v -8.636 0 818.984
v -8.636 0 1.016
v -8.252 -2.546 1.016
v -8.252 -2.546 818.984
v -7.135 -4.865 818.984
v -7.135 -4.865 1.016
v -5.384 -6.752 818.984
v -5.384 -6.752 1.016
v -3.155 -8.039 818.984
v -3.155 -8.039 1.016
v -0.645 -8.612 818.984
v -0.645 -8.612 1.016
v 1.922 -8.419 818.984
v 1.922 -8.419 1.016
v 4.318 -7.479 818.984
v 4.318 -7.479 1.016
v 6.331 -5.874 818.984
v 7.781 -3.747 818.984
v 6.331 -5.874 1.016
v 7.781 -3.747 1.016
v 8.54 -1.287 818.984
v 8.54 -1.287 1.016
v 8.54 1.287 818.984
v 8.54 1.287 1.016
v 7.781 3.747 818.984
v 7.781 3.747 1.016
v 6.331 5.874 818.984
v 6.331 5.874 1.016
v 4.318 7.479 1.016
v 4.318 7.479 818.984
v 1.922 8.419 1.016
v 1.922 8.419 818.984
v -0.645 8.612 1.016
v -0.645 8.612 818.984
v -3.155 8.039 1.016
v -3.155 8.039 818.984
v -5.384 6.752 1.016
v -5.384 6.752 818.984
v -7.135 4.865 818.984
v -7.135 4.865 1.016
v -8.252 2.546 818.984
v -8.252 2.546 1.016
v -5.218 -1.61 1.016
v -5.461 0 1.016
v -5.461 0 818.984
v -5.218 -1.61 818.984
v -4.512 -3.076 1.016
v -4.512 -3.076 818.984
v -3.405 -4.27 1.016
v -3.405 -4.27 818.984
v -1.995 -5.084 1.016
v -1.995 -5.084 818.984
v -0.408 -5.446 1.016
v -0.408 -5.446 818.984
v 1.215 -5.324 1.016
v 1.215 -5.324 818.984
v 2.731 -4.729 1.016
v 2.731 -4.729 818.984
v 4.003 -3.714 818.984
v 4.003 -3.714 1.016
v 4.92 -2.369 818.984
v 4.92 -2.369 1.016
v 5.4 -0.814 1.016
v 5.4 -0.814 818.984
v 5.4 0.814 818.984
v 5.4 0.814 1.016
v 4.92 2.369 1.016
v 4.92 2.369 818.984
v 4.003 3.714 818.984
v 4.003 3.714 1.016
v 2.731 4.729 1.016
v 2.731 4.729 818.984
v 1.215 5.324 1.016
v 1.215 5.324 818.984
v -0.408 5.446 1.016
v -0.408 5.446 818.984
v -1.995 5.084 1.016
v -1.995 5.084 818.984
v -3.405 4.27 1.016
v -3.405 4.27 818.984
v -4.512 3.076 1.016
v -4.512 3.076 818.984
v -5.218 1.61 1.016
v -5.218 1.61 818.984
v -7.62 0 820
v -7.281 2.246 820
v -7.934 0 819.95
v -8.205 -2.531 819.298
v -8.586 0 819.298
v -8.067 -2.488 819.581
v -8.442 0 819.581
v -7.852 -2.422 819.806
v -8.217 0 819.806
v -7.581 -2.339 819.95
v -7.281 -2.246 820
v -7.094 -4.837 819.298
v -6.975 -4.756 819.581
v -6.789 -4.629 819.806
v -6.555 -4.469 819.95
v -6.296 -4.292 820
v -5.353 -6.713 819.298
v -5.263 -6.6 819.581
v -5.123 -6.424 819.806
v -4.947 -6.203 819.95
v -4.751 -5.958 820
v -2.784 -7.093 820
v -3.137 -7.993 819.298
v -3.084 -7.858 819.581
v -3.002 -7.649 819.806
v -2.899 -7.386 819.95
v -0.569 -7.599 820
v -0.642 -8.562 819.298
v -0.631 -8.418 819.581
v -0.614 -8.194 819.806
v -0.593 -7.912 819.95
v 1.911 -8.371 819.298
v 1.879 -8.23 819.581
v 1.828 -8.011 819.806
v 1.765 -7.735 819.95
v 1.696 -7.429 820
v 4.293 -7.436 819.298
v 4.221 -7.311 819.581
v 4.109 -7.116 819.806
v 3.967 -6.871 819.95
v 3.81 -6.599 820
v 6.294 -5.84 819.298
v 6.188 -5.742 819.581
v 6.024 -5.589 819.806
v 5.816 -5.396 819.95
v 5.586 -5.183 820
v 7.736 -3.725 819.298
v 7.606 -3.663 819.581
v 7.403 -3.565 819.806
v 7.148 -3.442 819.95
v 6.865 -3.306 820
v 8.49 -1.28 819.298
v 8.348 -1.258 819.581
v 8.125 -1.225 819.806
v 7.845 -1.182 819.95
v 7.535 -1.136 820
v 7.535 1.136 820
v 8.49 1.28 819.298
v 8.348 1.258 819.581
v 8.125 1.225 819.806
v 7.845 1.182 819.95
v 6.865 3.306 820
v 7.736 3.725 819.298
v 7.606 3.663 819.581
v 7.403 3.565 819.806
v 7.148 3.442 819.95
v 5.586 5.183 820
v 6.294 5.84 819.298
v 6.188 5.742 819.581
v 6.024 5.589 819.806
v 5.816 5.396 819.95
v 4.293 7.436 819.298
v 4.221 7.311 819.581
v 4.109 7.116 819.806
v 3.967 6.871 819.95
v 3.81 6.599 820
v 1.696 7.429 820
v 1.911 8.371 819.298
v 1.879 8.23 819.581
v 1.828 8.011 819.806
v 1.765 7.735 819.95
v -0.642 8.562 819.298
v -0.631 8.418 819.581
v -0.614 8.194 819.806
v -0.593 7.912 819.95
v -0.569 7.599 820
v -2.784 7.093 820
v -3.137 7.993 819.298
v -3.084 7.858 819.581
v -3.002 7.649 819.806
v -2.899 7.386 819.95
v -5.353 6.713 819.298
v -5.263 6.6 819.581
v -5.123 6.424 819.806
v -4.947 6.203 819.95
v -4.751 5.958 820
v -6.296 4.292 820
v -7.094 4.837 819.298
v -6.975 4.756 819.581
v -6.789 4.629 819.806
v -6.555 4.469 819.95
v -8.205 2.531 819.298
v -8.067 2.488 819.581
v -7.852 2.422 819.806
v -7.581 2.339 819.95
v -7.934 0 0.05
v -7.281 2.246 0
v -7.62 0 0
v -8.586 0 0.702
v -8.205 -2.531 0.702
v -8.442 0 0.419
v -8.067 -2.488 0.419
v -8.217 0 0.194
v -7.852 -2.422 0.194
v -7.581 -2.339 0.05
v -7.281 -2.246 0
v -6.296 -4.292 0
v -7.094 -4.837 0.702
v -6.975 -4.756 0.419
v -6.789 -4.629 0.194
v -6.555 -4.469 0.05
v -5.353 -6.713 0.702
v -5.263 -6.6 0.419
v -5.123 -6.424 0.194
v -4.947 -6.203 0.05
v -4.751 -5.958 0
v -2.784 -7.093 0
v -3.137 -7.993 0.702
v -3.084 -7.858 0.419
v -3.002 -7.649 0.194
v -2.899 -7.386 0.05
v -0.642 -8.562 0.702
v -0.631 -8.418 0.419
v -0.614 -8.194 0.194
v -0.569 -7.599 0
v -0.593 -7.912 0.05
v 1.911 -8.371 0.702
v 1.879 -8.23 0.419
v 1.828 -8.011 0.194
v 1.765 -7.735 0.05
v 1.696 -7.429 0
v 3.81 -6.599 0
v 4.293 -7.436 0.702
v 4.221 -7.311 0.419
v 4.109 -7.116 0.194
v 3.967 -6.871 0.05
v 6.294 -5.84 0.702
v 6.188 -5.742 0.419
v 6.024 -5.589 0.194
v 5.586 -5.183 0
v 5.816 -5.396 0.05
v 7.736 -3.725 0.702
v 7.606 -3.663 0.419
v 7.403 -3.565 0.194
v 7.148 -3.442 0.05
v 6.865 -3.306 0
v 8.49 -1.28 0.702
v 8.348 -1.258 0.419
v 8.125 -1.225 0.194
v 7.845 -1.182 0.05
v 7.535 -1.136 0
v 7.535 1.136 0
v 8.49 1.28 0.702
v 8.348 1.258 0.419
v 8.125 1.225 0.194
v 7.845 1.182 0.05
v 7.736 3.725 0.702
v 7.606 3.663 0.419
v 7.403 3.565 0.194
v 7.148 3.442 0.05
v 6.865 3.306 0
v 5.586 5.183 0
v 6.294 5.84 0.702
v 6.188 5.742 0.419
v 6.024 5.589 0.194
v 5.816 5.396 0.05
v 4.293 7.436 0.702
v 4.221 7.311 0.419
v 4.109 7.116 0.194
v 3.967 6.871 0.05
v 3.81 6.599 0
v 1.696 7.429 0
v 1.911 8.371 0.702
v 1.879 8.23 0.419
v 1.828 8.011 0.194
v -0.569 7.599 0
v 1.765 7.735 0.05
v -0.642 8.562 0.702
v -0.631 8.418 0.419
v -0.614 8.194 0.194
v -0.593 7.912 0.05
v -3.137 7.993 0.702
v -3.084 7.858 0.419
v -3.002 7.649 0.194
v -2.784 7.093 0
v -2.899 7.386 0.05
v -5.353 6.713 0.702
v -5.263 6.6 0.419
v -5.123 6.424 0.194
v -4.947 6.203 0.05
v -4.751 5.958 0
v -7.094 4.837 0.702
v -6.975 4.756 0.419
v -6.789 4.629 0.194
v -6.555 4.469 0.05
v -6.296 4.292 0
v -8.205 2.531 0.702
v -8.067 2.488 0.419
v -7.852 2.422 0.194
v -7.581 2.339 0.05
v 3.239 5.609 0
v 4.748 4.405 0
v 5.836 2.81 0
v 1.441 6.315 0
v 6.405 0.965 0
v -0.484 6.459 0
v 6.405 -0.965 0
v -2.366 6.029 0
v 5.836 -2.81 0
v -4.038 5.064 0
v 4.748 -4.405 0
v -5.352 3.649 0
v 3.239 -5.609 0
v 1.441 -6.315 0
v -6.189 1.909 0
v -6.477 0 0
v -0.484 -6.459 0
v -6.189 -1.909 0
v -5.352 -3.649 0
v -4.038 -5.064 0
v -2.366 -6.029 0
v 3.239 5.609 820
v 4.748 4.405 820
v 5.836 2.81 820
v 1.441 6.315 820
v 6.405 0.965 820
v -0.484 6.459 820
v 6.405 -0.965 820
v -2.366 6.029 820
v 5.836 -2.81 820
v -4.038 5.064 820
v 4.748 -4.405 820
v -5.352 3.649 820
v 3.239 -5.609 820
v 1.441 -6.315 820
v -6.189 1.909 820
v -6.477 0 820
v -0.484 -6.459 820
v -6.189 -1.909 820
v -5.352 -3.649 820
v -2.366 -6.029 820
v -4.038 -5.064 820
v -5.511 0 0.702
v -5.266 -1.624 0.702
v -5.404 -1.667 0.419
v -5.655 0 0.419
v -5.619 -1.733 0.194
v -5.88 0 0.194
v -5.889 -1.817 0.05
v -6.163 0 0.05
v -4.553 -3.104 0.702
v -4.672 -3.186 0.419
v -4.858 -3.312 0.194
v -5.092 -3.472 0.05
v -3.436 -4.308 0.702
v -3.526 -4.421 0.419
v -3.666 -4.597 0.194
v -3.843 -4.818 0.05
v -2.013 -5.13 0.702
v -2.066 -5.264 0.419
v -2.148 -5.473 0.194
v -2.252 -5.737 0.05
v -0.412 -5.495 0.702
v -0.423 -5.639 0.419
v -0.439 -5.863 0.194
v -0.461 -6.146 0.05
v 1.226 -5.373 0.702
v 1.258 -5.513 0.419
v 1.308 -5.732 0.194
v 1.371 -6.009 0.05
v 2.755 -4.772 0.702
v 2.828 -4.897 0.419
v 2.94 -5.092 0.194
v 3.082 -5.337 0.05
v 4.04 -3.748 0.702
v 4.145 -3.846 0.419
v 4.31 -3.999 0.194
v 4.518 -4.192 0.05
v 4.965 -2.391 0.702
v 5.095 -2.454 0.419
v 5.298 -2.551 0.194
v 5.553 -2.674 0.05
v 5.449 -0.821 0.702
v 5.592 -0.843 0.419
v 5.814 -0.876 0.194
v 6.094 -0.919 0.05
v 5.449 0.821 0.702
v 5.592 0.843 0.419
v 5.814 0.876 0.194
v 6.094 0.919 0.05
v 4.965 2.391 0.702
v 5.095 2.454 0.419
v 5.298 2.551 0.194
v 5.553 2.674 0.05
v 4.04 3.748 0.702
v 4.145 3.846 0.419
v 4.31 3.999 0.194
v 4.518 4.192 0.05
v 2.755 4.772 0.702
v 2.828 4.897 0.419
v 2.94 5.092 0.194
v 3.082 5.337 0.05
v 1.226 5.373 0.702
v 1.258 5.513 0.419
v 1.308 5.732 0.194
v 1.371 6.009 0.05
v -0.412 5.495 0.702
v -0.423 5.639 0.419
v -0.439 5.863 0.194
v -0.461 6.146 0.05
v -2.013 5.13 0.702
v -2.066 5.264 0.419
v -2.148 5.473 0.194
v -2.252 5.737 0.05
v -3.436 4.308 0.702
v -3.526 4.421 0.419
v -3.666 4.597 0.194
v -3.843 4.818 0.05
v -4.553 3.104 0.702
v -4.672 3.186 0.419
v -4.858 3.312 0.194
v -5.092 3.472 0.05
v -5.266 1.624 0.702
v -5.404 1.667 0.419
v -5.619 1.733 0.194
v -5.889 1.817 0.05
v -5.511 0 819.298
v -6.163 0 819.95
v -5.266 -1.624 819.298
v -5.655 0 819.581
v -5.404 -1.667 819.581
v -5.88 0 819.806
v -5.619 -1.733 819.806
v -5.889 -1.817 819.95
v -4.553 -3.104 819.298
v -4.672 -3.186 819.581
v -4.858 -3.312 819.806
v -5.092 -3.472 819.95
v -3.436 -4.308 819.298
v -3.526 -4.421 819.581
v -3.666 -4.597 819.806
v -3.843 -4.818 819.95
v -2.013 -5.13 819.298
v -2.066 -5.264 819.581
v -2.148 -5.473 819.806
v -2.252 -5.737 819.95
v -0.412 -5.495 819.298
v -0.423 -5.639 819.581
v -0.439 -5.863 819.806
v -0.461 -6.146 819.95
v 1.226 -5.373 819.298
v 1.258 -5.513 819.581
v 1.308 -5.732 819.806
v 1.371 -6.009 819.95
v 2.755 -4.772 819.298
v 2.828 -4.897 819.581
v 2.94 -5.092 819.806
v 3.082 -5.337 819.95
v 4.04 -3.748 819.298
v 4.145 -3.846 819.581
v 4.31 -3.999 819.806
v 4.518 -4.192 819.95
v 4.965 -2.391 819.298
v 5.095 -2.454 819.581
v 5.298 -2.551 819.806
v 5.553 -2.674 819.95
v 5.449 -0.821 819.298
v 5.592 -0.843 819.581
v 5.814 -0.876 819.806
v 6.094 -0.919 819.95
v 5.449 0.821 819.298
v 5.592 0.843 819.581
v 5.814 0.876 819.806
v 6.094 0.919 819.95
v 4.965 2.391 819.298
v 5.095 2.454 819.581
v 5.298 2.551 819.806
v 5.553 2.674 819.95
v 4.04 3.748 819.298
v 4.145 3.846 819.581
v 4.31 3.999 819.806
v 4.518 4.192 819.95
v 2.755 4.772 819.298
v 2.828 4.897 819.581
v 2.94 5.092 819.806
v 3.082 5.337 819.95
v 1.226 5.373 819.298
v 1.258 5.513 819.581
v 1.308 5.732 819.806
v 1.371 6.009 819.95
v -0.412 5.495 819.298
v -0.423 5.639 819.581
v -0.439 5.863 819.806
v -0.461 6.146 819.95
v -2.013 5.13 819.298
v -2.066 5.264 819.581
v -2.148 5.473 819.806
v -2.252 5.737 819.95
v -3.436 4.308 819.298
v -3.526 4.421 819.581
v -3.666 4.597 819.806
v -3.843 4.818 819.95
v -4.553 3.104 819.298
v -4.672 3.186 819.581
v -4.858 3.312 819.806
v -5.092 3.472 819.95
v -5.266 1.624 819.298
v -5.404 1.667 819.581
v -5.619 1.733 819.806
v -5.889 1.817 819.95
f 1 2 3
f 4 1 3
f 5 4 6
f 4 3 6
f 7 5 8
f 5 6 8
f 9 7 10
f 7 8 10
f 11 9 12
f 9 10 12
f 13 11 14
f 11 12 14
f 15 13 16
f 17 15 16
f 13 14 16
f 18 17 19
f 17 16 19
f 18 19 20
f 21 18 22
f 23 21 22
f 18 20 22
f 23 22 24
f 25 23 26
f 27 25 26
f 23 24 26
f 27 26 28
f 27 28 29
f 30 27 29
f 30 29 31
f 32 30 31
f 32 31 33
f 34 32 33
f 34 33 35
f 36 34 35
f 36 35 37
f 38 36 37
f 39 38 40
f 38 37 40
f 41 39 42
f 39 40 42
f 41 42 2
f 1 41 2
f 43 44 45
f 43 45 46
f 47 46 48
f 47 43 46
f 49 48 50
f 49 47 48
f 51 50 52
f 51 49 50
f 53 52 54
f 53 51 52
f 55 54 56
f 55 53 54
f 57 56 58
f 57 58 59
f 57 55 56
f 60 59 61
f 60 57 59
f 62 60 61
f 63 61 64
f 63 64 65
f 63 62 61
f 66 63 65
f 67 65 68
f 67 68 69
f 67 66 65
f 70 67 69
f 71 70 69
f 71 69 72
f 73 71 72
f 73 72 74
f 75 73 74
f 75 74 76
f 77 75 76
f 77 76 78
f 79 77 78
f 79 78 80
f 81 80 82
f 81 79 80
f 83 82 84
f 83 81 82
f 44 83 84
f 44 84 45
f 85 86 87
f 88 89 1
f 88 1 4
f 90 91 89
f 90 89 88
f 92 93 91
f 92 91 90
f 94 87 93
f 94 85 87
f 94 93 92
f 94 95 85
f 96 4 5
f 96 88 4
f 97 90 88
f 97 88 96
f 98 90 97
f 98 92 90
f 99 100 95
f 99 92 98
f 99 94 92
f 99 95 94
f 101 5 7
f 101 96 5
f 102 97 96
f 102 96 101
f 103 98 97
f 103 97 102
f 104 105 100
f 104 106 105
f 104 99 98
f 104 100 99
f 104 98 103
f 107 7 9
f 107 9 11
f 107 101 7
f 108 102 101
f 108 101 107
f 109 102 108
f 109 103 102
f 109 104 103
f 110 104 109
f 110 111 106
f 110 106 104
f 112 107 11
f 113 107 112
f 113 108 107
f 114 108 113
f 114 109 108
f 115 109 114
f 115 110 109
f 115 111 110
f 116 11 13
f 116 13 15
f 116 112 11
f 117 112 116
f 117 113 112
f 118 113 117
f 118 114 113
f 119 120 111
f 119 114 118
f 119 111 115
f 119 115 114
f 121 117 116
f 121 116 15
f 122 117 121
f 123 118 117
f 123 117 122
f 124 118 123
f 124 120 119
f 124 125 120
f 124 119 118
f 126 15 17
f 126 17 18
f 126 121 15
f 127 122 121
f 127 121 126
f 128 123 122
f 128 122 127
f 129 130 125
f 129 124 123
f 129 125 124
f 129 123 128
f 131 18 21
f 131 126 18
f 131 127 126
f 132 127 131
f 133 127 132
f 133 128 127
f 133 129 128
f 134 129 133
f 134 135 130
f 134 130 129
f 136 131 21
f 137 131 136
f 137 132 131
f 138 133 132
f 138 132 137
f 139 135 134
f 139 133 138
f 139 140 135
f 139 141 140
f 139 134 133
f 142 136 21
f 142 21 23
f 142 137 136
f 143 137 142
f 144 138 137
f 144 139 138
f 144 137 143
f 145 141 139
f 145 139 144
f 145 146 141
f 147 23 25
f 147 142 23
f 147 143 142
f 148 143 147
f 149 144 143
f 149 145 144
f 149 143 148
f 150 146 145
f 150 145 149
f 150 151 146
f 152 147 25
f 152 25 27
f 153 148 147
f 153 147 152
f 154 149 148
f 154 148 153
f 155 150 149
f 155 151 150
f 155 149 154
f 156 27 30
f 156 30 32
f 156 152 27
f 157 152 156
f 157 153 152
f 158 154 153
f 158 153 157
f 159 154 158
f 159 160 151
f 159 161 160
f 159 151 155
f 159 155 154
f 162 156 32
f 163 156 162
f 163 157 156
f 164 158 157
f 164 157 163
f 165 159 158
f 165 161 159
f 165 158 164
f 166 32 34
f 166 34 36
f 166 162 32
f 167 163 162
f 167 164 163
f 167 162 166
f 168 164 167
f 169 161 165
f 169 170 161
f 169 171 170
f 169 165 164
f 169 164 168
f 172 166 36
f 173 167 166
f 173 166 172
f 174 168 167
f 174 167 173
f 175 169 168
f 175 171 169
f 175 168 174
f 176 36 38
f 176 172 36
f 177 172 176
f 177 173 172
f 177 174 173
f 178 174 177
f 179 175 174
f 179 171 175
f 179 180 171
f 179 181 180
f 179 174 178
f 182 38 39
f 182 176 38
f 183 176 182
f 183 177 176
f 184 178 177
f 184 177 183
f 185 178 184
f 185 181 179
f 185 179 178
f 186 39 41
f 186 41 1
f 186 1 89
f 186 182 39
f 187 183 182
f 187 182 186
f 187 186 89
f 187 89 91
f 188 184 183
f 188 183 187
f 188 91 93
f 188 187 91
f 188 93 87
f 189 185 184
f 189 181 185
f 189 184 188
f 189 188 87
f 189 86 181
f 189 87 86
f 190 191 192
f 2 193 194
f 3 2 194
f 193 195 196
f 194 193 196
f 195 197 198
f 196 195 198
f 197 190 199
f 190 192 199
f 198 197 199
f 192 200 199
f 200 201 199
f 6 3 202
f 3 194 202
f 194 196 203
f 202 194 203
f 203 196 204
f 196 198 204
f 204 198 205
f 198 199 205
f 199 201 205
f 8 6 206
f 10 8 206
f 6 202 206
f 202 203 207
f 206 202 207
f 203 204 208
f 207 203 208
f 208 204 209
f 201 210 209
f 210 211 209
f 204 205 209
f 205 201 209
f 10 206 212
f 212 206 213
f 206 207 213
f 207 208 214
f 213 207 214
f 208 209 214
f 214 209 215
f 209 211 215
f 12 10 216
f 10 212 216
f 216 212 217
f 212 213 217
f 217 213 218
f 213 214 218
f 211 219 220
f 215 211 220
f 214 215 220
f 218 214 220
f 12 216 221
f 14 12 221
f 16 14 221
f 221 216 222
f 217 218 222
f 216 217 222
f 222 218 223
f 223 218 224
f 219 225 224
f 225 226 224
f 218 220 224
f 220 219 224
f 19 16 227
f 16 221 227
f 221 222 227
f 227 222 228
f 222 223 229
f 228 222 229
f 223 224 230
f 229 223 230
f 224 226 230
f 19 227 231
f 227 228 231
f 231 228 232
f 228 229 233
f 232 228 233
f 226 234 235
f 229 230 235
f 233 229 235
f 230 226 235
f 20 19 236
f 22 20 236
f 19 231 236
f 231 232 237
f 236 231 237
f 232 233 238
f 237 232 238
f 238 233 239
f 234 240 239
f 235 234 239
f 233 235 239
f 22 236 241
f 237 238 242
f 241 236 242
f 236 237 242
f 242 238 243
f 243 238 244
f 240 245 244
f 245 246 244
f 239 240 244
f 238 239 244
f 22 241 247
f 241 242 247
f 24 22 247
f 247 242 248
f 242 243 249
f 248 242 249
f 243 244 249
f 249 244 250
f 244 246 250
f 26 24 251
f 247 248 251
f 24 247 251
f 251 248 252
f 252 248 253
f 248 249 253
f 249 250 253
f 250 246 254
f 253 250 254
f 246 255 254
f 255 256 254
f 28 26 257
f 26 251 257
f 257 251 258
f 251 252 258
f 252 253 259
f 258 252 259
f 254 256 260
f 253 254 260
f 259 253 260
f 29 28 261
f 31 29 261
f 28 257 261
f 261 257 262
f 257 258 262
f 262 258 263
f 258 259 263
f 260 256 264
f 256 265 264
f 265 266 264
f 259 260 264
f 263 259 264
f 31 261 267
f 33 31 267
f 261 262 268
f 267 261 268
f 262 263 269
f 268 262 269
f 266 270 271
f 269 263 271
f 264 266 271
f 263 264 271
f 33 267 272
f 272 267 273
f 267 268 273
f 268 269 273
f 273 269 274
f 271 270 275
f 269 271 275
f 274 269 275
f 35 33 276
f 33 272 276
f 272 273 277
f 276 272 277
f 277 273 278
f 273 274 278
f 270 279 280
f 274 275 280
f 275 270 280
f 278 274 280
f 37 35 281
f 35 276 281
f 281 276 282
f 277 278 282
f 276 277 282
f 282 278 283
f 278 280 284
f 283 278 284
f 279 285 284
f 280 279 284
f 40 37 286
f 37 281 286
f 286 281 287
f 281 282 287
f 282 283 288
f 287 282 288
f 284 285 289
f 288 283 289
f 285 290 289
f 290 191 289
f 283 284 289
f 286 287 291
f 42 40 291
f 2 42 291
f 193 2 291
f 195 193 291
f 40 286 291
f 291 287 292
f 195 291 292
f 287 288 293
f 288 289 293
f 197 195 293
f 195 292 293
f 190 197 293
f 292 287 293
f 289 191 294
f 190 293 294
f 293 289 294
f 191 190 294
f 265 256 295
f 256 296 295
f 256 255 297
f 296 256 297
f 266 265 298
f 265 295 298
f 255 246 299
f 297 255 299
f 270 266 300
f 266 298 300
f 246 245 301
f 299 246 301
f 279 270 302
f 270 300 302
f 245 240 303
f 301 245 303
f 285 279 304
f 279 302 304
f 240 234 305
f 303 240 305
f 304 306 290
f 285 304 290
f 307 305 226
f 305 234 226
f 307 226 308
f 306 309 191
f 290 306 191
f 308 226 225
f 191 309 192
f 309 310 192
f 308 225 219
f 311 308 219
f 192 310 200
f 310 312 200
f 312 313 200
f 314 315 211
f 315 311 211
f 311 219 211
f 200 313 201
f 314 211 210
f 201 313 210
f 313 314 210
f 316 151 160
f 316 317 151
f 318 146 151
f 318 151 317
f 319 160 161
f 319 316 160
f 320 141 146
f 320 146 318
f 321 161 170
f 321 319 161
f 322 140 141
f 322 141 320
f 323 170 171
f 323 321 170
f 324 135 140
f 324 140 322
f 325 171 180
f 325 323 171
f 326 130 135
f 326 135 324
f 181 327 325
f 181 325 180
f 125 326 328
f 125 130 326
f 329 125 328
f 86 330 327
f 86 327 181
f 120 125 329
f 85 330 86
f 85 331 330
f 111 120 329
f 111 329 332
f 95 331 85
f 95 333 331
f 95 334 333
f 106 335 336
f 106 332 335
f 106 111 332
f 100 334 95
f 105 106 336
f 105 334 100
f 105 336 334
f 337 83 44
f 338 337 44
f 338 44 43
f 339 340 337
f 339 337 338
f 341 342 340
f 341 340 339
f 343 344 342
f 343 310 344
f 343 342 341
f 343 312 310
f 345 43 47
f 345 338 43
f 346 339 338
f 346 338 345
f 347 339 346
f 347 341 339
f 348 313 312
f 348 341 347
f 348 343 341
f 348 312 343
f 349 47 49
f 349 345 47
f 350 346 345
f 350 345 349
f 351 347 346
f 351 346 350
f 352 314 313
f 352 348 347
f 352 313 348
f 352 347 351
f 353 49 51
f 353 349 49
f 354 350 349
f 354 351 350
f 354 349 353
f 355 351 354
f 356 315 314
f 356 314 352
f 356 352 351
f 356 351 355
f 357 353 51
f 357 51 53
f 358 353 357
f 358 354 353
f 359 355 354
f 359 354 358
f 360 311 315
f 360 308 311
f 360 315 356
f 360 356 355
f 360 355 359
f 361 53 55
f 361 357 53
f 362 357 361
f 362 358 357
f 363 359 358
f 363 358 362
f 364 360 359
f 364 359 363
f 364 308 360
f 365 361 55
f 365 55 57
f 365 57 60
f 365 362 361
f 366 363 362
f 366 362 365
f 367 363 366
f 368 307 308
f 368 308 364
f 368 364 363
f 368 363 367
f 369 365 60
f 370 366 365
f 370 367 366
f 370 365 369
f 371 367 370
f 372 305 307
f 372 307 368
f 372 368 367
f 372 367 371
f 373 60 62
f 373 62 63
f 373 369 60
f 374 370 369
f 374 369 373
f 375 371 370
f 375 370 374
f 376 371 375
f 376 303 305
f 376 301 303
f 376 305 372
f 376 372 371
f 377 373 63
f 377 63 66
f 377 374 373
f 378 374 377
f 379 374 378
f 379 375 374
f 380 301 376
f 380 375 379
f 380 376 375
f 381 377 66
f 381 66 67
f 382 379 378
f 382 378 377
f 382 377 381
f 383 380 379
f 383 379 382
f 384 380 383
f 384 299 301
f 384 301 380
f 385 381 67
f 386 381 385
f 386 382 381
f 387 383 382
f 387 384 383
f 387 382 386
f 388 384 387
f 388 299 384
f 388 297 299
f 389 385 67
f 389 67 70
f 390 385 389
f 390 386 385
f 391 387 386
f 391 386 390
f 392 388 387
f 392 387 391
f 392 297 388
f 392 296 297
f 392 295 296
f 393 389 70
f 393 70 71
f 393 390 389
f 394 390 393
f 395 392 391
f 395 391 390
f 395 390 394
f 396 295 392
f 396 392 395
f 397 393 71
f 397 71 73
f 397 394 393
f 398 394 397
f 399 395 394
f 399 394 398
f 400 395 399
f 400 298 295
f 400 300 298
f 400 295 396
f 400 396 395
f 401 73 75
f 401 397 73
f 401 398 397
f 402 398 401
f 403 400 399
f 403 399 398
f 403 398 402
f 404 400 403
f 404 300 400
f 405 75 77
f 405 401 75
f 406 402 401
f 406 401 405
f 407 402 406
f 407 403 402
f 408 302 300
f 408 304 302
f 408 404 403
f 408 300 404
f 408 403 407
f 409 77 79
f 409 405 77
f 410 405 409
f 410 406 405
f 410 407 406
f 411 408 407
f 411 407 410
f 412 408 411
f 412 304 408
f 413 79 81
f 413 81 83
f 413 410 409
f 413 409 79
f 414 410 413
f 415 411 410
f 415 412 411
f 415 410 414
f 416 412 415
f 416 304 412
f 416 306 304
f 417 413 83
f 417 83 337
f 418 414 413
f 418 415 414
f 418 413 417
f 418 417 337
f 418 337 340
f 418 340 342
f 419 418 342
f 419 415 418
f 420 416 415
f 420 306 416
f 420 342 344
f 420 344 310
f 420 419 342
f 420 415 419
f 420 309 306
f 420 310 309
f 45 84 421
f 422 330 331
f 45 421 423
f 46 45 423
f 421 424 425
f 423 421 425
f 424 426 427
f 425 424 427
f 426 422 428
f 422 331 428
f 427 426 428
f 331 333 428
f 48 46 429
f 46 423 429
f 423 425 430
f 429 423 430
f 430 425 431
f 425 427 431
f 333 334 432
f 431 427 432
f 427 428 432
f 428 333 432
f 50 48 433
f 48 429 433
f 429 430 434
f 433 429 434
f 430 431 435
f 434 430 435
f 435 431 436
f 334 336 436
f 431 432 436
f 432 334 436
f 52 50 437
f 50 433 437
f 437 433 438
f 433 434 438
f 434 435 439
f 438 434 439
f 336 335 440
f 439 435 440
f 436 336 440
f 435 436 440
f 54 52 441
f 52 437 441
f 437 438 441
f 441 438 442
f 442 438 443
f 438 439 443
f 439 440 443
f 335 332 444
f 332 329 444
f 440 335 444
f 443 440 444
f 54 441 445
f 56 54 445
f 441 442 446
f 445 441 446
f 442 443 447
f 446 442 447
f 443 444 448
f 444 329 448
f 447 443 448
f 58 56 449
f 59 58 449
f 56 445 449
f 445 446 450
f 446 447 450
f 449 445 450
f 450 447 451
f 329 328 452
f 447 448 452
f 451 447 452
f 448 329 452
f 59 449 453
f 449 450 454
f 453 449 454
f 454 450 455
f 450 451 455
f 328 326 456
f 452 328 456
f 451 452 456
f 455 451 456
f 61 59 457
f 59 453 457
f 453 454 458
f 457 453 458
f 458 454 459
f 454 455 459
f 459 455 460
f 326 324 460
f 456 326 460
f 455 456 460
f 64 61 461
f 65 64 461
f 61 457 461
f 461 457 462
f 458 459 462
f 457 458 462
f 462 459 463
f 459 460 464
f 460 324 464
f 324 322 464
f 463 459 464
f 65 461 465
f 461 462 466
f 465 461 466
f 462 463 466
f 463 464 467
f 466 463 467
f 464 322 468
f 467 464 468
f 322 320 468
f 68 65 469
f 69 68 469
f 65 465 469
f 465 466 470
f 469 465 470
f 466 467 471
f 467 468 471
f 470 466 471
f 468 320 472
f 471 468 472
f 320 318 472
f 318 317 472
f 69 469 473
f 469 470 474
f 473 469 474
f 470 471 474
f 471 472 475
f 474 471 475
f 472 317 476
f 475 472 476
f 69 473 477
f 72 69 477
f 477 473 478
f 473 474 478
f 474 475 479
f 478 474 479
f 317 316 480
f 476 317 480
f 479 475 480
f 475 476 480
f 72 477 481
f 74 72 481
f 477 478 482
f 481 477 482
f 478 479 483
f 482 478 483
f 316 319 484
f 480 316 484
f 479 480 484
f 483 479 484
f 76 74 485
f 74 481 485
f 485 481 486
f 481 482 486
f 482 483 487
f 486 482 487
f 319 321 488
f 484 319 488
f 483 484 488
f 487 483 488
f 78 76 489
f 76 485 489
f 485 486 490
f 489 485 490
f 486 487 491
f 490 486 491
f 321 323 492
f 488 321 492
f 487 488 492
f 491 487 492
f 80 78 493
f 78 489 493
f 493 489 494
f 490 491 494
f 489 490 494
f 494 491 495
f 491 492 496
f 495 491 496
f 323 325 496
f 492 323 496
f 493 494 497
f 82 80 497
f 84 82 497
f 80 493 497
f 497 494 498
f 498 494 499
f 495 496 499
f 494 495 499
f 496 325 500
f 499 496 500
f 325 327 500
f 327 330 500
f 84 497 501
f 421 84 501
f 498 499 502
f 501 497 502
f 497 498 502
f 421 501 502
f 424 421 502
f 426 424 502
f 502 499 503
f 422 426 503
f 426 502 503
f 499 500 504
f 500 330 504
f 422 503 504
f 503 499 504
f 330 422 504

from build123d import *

# Parameters (mm, degrees)
SKETCH2_R           = 8.636
SKETCH2_R_2         = 5.461
BOSS_EXTRUDE1_DEPTH = 820
FILLET1_R           = 1.016


with BuildPart() as part:
    # Sketch2 → Boss-Extrude1 (new body)
    with BuildSketch(Plane.XY):
        with Locations(Location((0, 0, 0), (0, 0, 180))):
            Circle(SKETCH2_R)
        with Locations(Location((0, 0, 0), (0, 0, 180))):
            Circle(SKETCH2_R_2, mode=Mode.SUBTRACT)
    extrude(amount=BOSS_EXTRUDE1_DEPTH)

    # Fillet1
    fillet1_edges = [part.edges().sort_by_distance(p)[0] for p in [
        (8.636, 0, 0),
        (8.636, 0, 820),
        (5.461, 0, 0),
        (5.461, 0, 820),
    ]]
    fillet(fillet1_edges, radius=FILLET1_R)


solid = part.part
